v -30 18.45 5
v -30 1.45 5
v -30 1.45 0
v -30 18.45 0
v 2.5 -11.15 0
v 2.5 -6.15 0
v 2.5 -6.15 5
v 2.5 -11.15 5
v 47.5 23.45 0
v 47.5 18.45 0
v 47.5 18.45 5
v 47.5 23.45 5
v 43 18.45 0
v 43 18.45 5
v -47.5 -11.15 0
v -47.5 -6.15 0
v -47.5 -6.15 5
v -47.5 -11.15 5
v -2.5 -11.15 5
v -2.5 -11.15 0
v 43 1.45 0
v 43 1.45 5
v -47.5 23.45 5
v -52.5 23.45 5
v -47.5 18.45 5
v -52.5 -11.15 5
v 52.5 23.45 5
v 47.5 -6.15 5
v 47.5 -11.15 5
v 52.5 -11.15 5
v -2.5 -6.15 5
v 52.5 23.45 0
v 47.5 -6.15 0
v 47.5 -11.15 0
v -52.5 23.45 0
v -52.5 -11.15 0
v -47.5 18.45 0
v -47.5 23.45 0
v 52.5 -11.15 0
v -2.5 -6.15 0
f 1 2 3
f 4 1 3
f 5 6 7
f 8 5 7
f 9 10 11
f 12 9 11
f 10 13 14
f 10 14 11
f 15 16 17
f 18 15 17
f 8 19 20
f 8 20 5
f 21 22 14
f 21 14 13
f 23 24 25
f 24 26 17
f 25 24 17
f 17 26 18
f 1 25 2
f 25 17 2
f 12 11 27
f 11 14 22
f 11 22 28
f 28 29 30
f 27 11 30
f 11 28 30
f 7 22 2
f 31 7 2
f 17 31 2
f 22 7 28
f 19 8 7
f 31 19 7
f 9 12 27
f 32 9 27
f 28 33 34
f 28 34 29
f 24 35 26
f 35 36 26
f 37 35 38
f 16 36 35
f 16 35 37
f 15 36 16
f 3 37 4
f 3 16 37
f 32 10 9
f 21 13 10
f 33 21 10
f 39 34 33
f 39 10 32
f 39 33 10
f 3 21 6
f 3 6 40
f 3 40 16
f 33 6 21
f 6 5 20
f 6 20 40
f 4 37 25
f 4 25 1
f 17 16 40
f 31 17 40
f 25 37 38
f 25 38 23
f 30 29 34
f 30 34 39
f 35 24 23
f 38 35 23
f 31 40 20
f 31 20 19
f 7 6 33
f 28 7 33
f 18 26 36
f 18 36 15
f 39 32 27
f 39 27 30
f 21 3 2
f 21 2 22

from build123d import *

# Parameters (mm, degrees)
SKETCH1_W           = 105
SKETCH1_H           = 12.3
BOSS_EXTRUDE1_DEPTH = 5
SKETCH2_W           = 5
SKETCH2_H           = 5
BOSS_EXTRUDE2_DEPTH = 5
SKETCH3_W           = 73
SKETCH3_H           = 5
CUT_EXTRUDE1_DEPTH  = 17
SKETCH4_W           = 5
SKETCH4_H           = 5
BOSS_EXTRUDE3_DEPTH = 5


with BuildPart() as part:
    # Sketch1 → Boss-Extrude1 (new body)
    with BuildSketch(Plane.XY):
        Rectangle(SKETCH1_W, SKETCH1_H)
    extrude(amount=BOSS_EXTRUDE1_DEPTH)

    # Sketch2 → Boss-Extrude2 (add)
    with BuildSketch(Plane.XZ.offset(6.15)):
        with Locations((-50, 2.5)):
            Rectangle(SKETCH2_W, SKETCH2_H)
        with Locations((50, 2.5)):
            Rectangle(SKETCH2_W, SKETCH2_H)
    extrude(amount=BOSS_EXTRUDE2_DEPTH)

    # Mirror1: part across plane


with BuildPart() as part_1:
    add(part.part)
    add(part.part.mirror(Plane(origin=(-52.5, 6.15, 5), x_dir=(0, 0, 1), z_dir=(0, -1, 0))))

    # Sketch3 → Cut-Extrude1 (cut)
    with BuildSketch(Plane(origin=(0, 18.45, 0), x_dir=(1, 0, 0), z_dir=(0, 1, 0))):
        with Locations((6.5, -2.5)):
            Rectangle(SKETCH3_W, SKETCH3_H)
    extrude(amount=-CUT_EXTRUDE1_DEPTH, mode=Mode.SUBTRACT)

    # Sketch4 → Boss-Extrude3 (add)
    with BuildSketch(Plane.XZ.offset(6.15)):
        with Locations((0, 2.5)):
            Rectangle(SKETCH4_W, SKETCH4_H)
    extrude(amount=BOSS_EXTRUDE3_DEPTH)


solid = part_1.part
